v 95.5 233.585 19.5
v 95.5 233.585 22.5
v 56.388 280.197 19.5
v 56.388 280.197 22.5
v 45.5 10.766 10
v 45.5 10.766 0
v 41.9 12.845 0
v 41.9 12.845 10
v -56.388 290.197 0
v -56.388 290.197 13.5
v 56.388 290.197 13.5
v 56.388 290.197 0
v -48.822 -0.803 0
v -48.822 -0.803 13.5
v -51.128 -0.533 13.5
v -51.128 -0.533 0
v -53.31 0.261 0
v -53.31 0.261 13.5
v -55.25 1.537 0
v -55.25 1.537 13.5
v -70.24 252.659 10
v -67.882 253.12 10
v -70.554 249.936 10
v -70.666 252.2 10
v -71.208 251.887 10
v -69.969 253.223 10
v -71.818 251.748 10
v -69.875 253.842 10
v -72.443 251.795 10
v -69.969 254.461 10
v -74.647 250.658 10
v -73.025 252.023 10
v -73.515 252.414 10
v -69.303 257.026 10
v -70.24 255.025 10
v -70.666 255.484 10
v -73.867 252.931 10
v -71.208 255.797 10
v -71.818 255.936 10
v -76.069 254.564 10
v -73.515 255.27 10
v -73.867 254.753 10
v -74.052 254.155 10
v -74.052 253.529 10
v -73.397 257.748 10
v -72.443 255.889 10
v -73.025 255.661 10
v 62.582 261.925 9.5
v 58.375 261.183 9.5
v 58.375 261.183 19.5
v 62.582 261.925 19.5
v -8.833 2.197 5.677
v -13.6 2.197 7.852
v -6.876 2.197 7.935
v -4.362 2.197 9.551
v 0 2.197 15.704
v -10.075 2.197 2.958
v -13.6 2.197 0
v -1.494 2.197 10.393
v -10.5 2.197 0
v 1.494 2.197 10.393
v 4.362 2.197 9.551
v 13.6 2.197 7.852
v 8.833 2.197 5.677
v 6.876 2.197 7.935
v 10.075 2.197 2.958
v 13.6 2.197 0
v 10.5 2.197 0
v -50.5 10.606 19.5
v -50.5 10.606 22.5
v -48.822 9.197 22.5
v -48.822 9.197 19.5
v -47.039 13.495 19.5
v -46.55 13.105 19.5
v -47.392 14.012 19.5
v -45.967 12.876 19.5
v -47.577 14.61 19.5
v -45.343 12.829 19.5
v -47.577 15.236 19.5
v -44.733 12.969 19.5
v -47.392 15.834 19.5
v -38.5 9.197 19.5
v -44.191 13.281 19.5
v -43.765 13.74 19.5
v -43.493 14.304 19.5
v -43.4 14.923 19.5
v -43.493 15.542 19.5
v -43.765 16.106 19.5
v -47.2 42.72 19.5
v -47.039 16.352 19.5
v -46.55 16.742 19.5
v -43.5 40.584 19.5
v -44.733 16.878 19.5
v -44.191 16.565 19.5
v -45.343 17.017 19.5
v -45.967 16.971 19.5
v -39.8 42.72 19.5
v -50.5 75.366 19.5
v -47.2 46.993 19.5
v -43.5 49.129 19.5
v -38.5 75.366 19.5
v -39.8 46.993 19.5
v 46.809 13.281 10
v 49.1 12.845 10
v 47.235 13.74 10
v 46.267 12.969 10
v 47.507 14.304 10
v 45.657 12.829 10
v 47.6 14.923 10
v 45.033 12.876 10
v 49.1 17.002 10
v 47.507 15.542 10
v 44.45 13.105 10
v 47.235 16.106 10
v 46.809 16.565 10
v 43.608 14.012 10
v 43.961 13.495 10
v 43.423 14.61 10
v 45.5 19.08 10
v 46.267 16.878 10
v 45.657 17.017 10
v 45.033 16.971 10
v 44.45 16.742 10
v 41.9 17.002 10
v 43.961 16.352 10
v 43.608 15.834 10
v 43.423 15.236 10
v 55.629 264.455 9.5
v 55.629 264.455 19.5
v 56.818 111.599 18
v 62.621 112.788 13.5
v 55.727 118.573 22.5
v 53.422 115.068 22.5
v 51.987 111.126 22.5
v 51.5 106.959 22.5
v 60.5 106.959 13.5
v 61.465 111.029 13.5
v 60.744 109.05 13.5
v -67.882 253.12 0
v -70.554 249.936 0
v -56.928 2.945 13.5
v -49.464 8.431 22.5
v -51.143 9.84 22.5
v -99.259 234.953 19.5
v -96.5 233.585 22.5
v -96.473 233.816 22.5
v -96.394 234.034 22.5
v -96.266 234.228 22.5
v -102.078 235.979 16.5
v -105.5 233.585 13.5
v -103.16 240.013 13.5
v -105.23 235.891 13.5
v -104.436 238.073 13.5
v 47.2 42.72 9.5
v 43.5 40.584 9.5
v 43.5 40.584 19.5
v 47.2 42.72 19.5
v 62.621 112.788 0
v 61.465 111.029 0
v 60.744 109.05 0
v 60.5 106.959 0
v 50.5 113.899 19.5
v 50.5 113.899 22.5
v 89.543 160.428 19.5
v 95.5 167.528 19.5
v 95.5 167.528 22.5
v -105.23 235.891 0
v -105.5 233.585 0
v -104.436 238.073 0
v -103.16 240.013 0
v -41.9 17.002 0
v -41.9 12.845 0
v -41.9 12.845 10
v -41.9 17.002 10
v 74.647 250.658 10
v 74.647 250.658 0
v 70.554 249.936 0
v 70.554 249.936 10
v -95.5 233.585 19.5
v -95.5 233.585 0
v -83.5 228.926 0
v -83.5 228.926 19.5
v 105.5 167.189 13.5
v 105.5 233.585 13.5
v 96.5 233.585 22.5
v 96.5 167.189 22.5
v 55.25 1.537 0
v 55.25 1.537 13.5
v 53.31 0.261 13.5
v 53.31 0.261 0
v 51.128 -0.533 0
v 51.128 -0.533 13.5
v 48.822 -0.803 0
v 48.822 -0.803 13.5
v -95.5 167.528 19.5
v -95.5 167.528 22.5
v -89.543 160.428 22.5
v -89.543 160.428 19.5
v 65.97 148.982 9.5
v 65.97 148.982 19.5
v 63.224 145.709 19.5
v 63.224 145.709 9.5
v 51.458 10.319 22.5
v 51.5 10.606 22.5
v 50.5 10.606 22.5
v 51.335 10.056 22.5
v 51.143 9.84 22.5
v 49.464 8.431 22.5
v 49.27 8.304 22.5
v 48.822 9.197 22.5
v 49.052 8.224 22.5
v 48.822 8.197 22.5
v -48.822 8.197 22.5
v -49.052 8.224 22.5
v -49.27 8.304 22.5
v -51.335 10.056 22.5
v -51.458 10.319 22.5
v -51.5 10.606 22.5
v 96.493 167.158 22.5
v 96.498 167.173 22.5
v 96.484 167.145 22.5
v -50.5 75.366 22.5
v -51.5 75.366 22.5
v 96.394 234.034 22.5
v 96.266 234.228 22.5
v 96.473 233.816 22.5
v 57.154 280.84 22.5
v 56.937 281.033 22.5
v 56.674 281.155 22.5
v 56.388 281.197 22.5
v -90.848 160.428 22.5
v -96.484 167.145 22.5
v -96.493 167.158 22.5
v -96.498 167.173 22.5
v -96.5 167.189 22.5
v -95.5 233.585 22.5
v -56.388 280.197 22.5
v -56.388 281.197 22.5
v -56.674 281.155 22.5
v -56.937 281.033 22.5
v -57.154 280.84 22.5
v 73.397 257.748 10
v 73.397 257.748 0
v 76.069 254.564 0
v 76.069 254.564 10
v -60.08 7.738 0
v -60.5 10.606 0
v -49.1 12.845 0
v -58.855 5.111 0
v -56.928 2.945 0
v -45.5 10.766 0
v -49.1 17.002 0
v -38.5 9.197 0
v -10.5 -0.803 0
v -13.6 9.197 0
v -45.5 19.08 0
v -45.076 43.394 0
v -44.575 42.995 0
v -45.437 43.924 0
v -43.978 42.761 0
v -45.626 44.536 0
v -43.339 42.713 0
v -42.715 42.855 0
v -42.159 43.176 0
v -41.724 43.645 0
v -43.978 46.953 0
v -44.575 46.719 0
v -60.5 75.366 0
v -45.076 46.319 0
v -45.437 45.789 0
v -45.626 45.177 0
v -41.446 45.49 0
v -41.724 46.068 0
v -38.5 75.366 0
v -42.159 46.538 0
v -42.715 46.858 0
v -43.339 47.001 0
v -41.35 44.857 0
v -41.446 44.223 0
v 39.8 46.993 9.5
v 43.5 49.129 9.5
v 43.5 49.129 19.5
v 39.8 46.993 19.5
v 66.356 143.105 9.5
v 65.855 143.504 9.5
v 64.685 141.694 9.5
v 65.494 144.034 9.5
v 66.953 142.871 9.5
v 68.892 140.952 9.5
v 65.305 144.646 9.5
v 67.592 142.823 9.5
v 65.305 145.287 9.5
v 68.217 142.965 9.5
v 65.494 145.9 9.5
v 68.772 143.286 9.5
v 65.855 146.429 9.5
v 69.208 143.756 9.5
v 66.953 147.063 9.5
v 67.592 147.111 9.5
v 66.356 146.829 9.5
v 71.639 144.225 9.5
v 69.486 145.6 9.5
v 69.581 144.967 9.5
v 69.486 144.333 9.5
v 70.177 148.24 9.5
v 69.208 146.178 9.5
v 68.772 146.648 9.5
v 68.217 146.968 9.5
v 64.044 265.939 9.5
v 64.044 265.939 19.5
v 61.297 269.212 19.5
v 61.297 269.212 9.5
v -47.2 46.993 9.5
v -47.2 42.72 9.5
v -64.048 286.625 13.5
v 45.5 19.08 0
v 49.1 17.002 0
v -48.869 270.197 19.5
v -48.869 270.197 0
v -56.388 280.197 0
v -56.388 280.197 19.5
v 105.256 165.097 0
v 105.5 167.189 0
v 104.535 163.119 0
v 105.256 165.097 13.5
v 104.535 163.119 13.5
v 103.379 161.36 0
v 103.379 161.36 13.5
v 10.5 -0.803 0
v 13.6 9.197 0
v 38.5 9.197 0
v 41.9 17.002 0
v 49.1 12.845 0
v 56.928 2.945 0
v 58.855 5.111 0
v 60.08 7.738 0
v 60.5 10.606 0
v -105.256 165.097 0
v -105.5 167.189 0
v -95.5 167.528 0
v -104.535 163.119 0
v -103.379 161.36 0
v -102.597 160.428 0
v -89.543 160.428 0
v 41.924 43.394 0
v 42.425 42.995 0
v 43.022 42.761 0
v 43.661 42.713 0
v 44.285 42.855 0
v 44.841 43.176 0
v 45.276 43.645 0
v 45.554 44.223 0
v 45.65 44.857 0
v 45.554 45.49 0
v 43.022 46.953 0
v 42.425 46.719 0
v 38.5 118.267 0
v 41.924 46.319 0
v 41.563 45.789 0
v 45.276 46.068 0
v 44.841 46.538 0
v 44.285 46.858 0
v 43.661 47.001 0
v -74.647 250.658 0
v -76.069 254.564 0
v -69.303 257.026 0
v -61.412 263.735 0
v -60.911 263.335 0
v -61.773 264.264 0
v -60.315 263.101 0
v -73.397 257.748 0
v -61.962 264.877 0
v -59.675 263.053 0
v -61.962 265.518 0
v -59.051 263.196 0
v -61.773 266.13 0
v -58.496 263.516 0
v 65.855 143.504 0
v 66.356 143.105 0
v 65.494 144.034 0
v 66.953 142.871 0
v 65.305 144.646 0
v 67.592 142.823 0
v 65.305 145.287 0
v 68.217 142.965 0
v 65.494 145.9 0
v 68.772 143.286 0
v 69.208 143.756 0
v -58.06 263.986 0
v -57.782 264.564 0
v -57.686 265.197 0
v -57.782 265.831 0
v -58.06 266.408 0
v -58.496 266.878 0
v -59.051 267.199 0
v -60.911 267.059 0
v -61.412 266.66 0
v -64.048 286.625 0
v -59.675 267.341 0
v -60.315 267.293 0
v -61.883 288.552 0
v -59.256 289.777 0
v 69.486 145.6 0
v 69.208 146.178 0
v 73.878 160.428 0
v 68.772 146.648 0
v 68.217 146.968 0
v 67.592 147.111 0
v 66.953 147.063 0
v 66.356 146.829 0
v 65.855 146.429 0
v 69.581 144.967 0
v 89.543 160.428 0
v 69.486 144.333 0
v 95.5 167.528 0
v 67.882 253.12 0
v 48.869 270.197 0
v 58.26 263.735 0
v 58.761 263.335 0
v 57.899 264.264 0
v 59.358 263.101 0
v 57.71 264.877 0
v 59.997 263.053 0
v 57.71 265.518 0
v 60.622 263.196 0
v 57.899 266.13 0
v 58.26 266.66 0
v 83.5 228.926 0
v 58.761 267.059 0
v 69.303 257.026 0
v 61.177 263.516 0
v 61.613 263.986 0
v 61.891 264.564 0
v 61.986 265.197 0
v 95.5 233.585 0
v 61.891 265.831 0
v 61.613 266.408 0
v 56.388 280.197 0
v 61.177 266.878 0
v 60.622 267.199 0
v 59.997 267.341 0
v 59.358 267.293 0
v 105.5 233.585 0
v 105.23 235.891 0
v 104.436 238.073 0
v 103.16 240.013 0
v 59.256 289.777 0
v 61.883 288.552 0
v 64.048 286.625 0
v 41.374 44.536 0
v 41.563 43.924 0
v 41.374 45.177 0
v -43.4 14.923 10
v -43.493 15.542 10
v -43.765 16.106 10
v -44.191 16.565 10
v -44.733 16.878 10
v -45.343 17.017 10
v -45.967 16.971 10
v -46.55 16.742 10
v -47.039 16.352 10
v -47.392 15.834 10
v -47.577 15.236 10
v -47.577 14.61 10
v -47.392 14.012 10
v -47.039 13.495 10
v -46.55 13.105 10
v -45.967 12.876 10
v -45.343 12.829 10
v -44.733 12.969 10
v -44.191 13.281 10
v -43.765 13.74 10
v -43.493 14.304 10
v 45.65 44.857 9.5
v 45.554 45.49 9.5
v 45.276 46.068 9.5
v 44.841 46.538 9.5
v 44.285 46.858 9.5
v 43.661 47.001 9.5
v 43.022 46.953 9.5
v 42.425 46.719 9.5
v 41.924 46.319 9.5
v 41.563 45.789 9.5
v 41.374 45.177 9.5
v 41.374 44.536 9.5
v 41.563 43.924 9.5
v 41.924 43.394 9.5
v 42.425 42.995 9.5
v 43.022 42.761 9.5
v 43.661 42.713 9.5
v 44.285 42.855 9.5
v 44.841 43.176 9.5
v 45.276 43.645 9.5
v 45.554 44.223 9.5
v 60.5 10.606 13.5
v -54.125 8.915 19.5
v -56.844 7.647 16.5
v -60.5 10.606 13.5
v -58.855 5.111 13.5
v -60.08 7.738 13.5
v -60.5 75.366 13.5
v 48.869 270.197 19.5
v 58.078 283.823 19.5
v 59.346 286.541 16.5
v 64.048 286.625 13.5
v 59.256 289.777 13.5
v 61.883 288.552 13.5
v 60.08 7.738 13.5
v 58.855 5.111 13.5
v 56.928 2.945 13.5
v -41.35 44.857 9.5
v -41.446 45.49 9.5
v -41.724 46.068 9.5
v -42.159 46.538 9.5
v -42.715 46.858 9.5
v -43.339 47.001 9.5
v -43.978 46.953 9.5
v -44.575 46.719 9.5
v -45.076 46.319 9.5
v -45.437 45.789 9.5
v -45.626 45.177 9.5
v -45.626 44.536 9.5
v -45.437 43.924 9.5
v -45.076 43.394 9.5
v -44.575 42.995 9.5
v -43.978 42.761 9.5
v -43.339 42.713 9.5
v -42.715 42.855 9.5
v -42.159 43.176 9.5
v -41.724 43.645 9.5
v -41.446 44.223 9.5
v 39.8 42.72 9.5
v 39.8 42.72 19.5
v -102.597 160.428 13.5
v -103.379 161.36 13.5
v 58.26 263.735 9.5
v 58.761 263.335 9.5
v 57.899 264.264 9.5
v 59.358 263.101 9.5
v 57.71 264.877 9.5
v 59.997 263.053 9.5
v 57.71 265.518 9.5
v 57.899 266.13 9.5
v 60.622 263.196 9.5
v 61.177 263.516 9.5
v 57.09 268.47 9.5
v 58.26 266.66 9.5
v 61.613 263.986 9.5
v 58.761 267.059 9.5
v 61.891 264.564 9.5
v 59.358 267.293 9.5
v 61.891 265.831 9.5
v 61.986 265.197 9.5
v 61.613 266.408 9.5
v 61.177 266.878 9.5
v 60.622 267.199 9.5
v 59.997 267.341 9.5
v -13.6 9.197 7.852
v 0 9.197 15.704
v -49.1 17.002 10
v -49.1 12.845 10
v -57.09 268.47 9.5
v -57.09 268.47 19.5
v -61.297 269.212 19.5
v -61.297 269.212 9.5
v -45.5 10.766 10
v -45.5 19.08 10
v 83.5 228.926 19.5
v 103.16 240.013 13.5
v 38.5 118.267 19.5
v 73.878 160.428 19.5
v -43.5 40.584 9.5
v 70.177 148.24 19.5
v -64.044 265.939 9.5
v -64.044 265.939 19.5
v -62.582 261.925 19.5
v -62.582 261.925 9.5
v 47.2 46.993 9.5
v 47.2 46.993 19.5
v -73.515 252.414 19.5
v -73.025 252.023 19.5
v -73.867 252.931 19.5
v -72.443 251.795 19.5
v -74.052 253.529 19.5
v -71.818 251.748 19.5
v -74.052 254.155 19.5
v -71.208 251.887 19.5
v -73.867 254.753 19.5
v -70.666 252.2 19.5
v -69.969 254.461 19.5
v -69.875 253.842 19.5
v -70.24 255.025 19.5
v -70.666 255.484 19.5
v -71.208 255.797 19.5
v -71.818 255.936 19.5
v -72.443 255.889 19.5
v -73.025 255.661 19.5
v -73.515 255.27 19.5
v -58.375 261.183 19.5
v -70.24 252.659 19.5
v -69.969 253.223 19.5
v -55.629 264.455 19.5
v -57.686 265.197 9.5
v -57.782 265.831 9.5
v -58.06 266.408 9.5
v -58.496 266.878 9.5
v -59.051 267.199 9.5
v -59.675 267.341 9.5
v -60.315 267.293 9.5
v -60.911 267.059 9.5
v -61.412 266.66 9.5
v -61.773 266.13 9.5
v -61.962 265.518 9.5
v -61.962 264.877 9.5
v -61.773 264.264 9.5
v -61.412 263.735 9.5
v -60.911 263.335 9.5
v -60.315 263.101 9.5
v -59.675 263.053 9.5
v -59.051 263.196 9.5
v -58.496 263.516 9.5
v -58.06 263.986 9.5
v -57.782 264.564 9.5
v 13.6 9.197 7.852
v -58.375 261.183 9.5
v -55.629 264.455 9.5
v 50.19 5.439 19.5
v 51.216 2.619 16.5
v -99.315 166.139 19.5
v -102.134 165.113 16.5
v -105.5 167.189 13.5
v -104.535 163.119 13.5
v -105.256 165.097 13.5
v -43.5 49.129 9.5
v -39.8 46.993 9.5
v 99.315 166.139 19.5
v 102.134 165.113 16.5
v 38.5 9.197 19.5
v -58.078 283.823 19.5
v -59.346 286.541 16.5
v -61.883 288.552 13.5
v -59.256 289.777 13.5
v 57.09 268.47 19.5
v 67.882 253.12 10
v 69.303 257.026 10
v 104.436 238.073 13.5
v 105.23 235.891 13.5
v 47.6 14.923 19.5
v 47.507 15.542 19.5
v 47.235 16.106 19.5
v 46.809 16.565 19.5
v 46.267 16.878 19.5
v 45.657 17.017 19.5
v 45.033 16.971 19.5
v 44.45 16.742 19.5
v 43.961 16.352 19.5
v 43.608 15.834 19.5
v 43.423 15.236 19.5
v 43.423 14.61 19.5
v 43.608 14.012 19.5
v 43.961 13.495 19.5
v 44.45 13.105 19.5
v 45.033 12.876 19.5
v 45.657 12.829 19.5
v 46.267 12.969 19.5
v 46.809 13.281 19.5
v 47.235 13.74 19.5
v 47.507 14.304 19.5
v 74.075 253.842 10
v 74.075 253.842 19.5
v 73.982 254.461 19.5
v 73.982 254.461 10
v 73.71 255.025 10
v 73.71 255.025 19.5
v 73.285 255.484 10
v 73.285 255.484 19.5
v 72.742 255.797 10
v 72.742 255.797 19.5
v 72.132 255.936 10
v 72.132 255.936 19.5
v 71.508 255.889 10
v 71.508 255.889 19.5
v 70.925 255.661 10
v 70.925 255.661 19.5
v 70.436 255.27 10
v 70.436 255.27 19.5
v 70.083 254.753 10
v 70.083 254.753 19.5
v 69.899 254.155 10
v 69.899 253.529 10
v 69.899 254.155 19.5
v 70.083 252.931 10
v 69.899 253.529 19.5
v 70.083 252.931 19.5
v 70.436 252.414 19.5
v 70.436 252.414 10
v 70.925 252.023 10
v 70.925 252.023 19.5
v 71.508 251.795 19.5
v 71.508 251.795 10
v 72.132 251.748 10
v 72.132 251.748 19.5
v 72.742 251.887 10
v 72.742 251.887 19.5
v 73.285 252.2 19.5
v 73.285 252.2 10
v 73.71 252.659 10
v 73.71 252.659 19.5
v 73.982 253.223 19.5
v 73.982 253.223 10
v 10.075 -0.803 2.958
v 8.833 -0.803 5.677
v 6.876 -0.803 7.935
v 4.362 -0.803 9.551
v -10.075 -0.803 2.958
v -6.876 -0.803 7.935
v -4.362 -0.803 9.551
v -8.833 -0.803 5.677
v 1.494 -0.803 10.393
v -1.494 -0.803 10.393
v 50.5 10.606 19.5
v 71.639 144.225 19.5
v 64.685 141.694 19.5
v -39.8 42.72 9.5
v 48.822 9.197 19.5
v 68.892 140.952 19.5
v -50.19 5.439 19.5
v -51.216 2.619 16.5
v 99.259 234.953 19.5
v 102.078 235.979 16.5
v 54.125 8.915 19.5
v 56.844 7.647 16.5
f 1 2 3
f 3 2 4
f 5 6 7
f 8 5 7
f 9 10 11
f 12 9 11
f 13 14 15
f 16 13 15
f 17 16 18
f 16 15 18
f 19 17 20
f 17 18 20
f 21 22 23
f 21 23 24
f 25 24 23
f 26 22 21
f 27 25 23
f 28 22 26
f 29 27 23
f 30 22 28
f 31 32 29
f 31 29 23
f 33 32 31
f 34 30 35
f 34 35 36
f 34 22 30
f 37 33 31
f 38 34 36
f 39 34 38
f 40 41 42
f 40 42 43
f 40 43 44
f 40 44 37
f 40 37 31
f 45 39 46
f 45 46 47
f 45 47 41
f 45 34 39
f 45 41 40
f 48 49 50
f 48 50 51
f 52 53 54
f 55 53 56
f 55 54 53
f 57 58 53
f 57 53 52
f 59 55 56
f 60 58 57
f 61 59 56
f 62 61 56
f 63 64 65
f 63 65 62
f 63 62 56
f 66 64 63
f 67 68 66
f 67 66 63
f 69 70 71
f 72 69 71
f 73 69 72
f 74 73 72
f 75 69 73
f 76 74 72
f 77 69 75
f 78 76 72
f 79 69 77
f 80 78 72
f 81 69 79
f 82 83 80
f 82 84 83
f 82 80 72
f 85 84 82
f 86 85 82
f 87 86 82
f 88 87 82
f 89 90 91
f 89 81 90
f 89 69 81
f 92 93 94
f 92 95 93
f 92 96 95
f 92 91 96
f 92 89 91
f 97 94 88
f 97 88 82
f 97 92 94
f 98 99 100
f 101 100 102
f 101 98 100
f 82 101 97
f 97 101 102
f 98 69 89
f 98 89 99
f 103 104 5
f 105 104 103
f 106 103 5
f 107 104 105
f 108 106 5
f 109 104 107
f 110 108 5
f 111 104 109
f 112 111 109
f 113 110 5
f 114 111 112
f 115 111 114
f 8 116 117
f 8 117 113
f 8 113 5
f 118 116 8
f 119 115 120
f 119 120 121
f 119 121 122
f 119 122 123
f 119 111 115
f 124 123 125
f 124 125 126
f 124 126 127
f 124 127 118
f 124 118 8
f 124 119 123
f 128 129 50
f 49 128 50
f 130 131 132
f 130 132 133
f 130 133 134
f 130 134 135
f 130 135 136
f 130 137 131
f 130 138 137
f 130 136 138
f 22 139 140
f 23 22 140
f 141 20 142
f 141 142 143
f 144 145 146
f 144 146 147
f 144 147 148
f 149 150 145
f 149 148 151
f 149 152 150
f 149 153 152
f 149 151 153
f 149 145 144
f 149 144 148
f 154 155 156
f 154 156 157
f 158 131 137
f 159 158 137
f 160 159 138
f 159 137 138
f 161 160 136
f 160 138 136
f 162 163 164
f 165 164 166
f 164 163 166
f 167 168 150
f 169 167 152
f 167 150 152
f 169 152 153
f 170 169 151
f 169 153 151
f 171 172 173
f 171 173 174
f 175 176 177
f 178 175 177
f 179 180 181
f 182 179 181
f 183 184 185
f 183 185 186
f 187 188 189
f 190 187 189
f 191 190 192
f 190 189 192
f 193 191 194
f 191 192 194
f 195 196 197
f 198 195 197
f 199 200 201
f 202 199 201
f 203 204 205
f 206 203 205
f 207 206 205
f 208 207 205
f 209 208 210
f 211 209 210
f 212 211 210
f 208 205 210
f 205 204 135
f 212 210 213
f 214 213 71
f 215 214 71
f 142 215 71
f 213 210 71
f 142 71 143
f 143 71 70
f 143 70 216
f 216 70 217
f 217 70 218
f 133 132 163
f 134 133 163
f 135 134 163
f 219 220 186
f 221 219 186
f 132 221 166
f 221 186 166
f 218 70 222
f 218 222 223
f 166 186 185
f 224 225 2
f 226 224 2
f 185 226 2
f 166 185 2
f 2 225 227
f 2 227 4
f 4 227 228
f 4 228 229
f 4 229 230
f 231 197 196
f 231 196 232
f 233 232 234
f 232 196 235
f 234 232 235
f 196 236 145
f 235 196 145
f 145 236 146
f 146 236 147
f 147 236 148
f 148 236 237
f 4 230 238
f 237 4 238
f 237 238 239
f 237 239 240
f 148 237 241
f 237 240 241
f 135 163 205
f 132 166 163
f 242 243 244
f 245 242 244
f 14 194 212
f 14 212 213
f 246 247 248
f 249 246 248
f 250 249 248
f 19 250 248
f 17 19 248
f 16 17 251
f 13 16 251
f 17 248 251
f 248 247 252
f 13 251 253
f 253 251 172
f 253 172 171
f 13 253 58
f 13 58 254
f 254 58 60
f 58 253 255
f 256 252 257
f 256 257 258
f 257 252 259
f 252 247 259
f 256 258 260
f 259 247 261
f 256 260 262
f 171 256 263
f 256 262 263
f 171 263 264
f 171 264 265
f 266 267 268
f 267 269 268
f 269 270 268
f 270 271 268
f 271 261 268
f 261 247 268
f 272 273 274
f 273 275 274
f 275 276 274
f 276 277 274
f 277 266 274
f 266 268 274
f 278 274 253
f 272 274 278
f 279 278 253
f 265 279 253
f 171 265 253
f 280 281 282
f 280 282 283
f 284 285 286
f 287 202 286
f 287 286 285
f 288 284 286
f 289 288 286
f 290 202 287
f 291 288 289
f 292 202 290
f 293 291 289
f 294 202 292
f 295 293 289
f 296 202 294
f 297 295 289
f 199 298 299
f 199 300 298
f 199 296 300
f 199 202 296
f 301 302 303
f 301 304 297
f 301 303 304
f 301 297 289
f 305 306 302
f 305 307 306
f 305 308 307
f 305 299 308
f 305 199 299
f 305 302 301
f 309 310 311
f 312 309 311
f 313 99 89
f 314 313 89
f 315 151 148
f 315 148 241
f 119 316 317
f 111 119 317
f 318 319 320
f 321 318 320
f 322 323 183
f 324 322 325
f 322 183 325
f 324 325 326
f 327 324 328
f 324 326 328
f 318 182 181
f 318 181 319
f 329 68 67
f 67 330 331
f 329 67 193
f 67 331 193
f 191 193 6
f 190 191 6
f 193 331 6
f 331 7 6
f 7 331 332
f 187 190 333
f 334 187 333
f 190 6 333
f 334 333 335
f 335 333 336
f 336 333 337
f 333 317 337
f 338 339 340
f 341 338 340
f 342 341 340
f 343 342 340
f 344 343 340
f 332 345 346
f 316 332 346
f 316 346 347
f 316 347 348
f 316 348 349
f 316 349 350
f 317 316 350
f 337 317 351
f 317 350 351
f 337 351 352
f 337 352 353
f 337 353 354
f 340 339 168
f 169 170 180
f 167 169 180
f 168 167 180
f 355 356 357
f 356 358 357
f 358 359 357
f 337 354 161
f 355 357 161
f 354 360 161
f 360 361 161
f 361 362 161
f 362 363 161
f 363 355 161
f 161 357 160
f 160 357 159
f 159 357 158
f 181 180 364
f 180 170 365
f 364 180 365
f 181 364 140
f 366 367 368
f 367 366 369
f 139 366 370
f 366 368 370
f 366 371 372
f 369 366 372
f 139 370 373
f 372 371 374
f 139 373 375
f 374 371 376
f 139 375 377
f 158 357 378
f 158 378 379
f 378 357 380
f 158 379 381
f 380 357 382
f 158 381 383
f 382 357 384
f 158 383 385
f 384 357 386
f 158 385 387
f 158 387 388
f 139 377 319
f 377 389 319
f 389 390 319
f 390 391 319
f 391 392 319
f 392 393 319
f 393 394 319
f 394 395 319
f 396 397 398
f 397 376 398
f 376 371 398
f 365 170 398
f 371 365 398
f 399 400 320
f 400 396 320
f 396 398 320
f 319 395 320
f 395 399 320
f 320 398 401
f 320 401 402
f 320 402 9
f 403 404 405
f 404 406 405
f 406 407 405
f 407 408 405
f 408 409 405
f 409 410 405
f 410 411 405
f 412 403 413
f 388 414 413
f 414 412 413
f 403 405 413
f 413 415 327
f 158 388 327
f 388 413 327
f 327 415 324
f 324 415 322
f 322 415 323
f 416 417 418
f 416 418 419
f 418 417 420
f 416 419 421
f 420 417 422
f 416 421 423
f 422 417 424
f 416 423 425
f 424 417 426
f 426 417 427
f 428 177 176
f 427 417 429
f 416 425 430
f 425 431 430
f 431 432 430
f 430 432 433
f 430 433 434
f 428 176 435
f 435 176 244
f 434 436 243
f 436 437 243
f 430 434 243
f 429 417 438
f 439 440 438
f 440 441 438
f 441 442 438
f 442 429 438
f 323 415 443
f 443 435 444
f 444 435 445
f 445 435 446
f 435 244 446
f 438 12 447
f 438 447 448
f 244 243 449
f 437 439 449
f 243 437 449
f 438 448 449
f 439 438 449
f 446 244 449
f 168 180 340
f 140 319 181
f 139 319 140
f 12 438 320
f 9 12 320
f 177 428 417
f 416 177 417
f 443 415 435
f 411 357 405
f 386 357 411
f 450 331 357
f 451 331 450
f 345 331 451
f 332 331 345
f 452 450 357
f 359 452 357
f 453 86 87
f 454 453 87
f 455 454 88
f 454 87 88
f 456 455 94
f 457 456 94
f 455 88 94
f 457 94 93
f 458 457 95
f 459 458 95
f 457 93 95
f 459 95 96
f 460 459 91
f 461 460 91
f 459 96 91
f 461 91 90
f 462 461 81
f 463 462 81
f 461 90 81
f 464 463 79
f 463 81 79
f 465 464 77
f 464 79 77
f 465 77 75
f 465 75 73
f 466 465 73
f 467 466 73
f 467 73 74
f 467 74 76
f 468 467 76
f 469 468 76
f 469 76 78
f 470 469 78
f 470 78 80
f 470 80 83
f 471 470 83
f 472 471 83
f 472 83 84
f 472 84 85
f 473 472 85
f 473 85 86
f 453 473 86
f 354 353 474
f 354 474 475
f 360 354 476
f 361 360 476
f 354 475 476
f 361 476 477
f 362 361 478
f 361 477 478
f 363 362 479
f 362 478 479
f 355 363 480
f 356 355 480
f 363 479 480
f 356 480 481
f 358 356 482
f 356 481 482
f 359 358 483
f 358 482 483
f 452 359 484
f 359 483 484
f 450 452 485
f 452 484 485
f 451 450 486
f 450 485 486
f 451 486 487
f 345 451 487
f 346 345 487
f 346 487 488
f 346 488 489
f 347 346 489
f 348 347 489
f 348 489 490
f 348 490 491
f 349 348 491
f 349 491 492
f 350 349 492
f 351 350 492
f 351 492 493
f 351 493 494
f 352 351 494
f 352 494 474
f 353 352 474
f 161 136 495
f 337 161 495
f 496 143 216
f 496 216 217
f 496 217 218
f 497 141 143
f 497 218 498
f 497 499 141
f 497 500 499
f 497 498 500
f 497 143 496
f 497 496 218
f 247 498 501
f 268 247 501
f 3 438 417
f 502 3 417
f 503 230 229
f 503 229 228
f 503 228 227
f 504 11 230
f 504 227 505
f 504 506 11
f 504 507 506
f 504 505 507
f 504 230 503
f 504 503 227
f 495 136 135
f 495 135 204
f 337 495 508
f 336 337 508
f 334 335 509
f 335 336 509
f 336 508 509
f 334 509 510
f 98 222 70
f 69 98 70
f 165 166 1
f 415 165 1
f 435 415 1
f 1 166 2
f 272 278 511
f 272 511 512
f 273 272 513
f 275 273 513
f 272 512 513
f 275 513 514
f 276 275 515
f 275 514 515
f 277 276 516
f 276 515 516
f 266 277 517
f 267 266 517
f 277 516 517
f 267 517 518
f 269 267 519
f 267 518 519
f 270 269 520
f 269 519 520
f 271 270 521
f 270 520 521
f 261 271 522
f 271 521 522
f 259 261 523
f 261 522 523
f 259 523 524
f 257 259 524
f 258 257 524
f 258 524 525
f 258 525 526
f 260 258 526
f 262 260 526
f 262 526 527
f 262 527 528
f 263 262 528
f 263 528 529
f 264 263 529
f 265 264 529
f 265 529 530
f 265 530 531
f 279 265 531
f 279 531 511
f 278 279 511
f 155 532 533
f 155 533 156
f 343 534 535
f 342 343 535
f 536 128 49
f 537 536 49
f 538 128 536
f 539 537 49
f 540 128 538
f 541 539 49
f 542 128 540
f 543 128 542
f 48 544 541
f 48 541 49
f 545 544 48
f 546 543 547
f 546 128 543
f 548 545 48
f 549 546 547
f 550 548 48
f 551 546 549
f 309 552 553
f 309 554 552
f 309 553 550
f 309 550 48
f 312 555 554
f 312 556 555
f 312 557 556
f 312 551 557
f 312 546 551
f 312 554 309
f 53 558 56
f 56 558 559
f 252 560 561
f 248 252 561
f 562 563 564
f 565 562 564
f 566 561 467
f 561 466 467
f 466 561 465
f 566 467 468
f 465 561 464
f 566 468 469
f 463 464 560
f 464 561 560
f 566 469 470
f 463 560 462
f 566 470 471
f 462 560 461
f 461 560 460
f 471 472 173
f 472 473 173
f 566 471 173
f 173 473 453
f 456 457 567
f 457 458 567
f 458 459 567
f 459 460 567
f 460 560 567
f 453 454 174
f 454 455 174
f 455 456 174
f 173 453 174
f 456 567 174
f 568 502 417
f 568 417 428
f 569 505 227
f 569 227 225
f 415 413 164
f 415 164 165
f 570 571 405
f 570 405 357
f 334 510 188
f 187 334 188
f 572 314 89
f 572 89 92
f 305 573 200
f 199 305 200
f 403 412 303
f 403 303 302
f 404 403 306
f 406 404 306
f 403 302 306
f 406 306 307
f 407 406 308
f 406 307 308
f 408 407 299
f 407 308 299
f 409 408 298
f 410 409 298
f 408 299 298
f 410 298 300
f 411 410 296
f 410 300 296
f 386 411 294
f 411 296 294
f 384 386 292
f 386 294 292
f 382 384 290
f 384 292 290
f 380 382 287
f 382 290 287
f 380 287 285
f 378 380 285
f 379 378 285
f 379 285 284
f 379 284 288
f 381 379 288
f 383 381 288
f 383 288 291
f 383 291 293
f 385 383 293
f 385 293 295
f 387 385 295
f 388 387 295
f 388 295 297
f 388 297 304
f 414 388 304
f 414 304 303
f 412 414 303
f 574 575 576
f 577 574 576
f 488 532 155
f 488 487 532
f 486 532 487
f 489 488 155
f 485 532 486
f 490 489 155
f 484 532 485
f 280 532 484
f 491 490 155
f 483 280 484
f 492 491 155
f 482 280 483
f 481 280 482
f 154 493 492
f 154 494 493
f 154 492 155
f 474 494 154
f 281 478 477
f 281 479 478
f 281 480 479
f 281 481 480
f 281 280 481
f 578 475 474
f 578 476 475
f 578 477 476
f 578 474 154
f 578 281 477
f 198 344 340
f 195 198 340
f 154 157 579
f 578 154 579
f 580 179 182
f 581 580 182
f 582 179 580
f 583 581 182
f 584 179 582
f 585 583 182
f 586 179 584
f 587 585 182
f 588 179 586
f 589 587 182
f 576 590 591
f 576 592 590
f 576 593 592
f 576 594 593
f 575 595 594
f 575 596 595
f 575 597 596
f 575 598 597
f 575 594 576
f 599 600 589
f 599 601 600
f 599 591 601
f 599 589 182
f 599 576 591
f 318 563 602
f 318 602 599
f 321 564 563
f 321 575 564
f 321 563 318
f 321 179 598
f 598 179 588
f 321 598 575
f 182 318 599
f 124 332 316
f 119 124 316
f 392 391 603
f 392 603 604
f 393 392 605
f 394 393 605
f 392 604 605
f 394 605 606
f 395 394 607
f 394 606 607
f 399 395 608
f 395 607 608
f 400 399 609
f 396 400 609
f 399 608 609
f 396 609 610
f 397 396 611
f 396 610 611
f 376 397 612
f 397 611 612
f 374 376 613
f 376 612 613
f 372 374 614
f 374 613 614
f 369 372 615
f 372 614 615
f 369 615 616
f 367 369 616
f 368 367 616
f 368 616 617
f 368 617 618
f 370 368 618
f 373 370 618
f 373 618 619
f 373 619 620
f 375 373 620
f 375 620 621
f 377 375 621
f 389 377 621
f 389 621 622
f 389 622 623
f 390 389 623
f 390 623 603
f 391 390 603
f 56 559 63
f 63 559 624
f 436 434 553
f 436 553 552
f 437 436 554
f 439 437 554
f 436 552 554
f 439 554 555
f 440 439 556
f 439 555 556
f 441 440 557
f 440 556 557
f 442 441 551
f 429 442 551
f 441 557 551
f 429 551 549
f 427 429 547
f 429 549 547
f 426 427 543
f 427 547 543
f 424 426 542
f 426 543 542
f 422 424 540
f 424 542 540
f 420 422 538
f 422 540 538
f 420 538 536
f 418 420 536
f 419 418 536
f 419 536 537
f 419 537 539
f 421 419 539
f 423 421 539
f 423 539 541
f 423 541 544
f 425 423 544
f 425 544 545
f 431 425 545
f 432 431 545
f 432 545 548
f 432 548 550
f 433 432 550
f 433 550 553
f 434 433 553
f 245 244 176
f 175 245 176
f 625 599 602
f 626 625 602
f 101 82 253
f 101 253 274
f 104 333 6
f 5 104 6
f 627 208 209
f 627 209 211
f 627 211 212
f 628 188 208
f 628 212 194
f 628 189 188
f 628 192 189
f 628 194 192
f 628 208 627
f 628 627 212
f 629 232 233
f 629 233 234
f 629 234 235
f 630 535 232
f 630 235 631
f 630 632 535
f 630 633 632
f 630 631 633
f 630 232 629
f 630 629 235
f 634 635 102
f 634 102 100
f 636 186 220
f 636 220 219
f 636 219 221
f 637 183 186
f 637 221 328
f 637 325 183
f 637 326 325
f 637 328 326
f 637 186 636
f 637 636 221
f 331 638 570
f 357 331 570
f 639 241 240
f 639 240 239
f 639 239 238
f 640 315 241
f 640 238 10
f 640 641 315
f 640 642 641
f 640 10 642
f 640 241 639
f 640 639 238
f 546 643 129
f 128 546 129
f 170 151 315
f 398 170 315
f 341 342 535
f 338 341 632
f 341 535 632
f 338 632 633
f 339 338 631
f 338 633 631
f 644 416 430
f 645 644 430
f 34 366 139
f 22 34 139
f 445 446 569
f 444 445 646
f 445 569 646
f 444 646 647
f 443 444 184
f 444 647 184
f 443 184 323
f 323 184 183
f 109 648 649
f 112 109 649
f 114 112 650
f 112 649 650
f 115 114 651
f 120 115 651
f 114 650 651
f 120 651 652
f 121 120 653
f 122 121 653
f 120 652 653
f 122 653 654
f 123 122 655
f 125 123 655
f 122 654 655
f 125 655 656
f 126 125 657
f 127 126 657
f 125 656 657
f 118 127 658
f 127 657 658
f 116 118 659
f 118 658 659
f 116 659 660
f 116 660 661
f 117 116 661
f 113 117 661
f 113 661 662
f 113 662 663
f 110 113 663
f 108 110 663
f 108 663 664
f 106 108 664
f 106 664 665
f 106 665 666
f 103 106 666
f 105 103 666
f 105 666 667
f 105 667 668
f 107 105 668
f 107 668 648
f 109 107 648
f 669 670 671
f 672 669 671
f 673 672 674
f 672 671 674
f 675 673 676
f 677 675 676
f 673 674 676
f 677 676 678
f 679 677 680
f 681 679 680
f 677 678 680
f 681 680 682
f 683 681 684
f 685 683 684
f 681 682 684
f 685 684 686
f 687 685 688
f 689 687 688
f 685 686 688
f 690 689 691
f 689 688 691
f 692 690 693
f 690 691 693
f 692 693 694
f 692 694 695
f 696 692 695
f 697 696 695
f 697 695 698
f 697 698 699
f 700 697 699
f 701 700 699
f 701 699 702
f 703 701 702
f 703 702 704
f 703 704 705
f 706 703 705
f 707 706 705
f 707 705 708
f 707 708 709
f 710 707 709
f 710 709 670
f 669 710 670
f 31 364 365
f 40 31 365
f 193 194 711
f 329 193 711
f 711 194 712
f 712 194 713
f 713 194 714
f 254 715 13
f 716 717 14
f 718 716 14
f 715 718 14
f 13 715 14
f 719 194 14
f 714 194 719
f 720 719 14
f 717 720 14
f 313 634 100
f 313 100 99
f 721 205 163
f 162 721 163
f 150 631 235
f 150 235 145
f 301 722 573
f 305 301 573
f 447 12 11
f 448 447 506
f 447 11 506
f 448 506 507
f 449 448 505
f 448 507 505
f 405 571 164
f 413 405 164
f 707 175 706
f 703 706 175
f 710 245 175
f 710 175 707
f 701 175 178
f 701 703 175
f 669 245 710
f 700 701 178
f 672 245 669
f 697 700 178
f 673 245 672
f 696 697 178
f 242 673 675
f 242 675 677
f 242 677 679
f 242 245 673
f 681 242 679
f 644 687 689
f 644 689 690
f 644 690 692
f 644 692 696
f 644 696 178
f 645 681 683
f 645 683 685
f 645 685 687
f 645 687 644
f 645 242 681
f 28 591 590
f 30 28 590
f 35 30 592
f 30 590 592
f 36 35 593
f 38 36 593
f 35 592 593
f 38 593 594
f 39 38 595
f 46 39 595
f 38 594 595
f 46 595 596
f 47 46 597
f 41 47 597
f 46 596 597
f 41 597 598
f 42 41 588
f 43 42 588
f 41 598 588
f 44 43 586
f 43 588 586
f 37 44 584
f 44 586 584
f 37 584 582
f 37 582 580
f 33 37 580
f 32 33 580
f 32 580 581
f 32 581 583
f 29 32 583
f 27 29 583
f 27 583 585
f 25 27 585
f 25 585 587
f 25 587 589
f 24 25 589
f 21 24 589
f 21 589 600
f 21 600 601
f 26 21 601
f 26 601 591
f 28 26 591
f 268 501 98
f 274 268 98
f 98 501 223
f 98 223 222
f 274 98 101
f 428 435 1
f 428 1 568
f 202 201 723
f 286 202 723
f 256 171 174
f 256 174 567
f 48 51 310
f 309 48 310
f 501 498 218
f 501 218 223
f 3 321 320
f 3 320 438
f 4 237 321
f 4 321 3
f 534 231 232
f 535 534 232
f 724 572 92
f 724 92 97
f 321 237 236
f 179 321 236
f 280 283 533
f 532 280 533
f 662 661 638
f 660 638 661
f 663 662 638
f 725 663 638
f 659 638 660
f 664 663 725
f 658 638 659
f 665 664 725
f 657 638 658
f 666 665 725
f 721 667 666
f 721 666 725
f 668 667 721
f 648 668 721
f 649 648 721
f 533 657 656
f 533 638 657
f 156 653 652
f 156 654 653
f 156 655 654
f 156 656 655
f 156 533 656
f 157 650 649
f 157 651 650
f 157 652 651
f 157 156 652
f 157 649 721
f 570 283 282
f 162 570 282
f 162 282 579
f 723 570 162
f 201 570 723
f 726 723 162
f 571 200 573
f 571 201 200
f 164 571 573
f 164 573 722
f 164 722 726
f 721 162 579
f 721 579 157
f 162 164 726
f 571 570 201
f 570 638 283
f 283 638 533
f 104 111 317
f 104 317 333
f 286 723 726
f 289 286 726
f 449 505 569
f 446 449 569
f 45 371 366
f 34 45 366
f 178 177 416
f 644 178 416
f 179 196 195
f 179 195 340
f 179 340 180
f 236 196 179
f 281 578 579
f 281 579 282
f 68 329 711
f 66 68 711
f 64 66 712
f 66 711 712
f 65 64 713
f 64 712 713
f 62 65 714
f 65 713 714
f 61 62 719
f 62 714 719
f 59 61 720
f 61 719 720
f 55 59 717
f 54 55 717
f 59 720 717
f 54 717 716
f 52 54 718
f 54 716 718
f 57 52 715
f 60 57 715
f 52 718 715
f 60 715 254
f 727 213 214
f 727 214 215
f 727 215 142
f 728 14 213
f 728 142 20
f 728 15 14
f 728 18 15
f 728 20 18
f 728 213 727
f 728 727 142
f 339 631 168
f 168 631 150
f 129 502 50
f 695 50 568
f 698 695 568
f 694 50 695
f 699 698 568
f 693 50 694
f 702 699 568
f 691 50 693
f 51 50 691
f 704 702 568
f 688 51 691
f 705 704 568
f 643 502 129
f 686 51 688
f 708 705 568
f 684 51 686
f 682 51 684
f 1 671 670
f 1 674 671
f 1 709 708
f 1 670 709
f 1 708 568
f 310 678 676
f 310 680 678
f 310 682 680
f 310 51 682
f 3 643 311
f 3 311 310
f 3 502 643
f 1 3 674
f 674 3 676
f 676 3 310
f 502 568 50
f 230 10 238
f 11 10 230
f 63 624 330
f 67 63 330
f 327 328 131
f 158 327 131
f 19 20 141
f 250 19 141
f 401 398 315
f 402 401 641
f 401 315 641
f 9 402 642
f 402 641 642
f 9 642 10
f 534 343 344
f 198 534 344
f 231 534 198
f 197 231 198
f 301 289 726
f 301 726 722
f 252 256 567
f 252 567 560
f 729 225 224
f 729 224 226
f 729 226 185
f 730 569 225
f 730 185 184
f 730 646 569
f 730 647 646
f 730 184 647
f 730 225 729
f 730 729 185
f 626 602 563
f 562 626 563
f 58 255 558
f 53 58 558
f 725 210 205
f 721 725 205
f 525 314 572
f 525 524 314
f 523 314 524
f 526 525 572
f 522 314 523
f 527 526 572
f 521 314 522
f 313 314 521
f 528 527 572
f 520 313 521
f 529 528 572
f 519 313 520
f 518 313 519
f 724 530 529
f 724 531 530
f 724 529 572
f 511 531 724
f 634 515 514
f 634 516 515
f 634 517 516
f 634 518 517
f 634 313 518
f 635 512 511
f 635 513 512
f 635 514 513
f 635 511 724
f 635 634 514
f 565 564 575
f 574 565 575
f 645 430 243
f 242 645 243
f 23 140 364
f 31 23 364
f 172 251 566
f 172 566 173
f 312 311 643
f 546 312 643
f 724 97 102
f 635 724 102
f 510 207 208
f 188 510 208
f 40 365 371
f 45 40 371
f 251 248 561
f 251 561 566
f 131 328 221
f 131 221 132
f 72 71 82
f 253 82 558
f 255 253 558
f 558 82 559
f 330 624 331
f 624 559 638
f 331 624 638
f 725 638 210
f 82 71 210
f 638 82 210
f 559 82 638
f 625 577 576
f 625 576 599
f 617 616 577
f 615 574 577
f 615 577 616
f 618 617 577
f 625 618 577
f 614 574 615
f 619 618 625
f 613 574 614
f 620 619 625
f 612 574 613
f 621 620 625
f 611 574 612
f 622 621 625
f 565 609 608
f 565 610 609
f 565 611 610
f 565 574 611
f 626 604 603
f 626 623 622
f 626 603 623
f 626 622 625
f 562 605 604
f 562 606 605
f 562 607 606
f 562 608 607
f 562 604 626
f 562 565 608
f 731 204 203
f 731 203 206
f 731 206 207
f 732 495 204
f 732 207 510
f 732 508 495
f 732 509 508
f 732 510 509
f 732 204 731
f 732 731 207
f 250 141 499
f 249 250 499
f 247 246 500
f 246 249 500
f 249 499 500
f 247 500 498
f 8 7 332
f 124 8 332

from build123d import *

# Parameters (mm, degrees)
RESSALTO_EXTRUS_O1_DEPTH = 22.5
CHANFRO1_SIZE            = 9
CORTE_EXTRUS_O1_REACH    = 24.5
ESBO_O3_W                = 1139.230904301
ESBO_O3_H                = 709.798033895
CORTE_EXTRUS_O5_DEPTH    = 3
CORTE_EXTRUS_O6_REACH    = 21.5
ESBO_O5_W                = 77
ESBO_O5_H                = 10
ESBO_O7_R                = 2.1
ESBO_O7_R_2              = 2.15
CORTE_EXTRUS_O7_DEPTH    = 23.5
CORTE_EXTRUS_O8_DEPTH    = 10
ESBO_O9_W                = 92.788829696
ESBO_O9_H                = 85.062360753
CORTE_EXTRUS_O9_DEPTH    = 23.5
CORTE_EXTRUS_O10_REACH   = 21.5
CORTE_EXTRUS_O11_DEPTH   = 7
ESBO_O12_R               = 10.5
CORTE_EXTRUS_O12_DEPTH   = 7
CORTE_EXTRUS_O13_DEPTH   = 10


with BuildPart() as part:
    # Esboço1 → Ressalto-extrusão1 (new body, symmetric)
    with BuildSketch(Plane.XY):
        with BuildLine():
            Line((-56.387503511, 290.197344596), (56.387503511, 290.197344596))
            ThreePointArc((56.387503511, 290.197344596), (60.613686129, 289.260422466), (64.047947942, 286.625220692))
            Line((64.047947942, 286.625220692), (103.160444431, 240.012762487))
            ThreePointArc((103.160444431, 240.012762487), (104.896926208, 237.005087823), (105.5, 233.58488639))
            Line((105.5, 233.58488639), (105.5, 167.188670131))
            ThreePointArc((105.5, 167.188670131), (104.953136861, 164.08725515), (103.378507208, 161.359916588))
            Line((103.378507208, 161.359916588), (62.621492792, 112.787598236))
            ThreePointArc((62.621492792, 112.787598236), (61.046863139, 110.060259674), (60.5, 106.958844693))
            Line((60.5, 106.958844693), (60.5, 10.605625498))
            ThreePointArc((60.5, 10.605625498), (59.56307787, 6.379442881), (56.927876097, 2.945181067))
            Line((56.927876097, 2.945181067), (55.249552272, 1.536900164))
            ThreePointArc((55.249552272, 1.536900164), (52.241877608, -0.199581612), (48.821676175, -0.802655404))
            Line((48.821676175, -0.802655404), (-48.821676175, -0.802655404))
            ThreePointArc((-48.821676175, -0.802655404), (-52.241877608, -0.199581612), (-55.249552272, 1.536900164))
            Line((-55.249552272, 1.536900164), (-56.927876097, 2.945181067))
            ThreePointArc((-56.927876097, 2.945181067), (-59.56307787, 6.379442881), (-60.5, 10.605625498))
            Line((-60.5, 10.605625498), (-60.5, 106.958844693))
            ThreePointArc((-60.5, 106.958844693), (-61.046863139, 110.060259674), (-62.621492792, 112.787598236))
            Line((-62.621492792, 112.787598236), (-103.378507208, 161.359916588))
            ThreePointArc((-103.378507208, 161.359916588), (-104.953136861, 164.08725515), (-105.5, 167.188670131))
            Line((-105.5, 167.188670131), (-105.5, 233.58488639))
            ThreePointArc((-105.5, 233.58488639), (-104.896926208, 237.005087823), (-103.160444431, 240.012762487))
            Line((-103.160444431, 240.012762487), (-64.047947942, 286.625220692))
            ThreePointArc((-64.047947942, 286.625220692), (-60.613686129, 289.260422466), (-56.387503511, 290.197344596))
        make_face()
        Polygon((-48.869071975, 270.197344596), (48.869071975, 270.197344596), (83.5, 228.925811707), (83.5, 171.895558399), (38.5, 118.266646732), (38.5, 19.197344596), (-38.5, 19.197344596), (-38.5, 118.266646732), (-83.5, 171.895558399), (-83.5, 228.925811707), align=None, mode=Mode.SUBTRACT)
    extrude(amount=RESSALTO_EXTRUS_O1_DEPTH, both=True)

    # Chanfro1
    chanfro1_edges = [part.edges().sort_by_distance(p)[0] for p in [
        (83.604196187, 263.318991589, 22.5),
        (60.613686129, 289.260422466, 22.5),
        (0, 290.197344596, 22.5),
        (-60.613686129, 289.260422466, 22.5),
        (-83.604196187, 263.318991589, 22.5),
        (-104.896926208, 237.005087823, 22.5),
        (-105.5, 200.38677826, 22.5),
        (-104.953136861, 164.08725515, 22.5),
        (-83, 137.073757412, 22.5),
        (-61.046863139, 110.060259674, 22.5),
        (-60.5, 58.782235095, 22.5),
        (-59.56307787, 6.379442881, 22.5),
        (-56.088714184, 2.241040616, 22.5),
        (-52.241877608, -0.199581612, 22.5),
        (0, -0.802655404, 22.5),
        (52.241877608, -0.199581612, 22.5),
        (56.088714184, 2.241040616, 22.5),
        (59.56307787, 6.379442881, 22.5),
        (60.5, 58.782235095, 22.5),
        (61.046863139, 110.060259674, 22.5),
        (83, 137.073757412, 22.5),
        (104.953136861, 164.08725515, 22.5),
        (105.5, 200.38677826, 22.5),
        (104.896926208, 237.005087823, 22.5),
    ]]
    chamfer(chanfro1_edges, length=CHANFRO1_SIZE)

    # Esboço3 → Corte-extrusão1 (cut, up to next)
    with BuildSketch(Plane.XY, mode=Mode.PRIVATE) as corte_extrus_o1_sk1:
        with Locations((-153.157436203, 152.53565808)):
            Rectangle(ESBO_O3_W, ESBO_O3_H)
    corte_extrus_o1_tool1 = extrude(corte_extrus_o1_sk1.sketch, amount=-CORTE_EXTRUS_O1_REACH, mode=Mode.PRIVATE) & part.part
    add(corte_extrus_o1_tool1.solids().sort_by_distance((-153.157436, 152.535658, 0))[0], mode=Mode.SUBTRACT)

    # Esboço4 → Corte-extrusão5 (cut)
    with BuildSketch(Plane.XY.offset(22.5)):
        Polygon((56.387503511, 280.197344596), (-56.387503511, 280.197344596), (-95.5, 233.58488639), (-95.5, 167.527915588), (-50.5, 113.899003921), (-50.5, 10.605625498), (-48.821676175, 9.197344596), (48.821676175, 9.197344596), (50.5, 10.605625498), (50.5, 113.899003921), (95.5, 167.527915588), (95.5, 233.58488639), align=None)
        Polygon((38.5, 19.197344596), (-38.5, 19.197344596), (-38.5, 121.489121124), (-83.5, 175.11803279), (-83.5, 228.925811707), (-48.869071975, 270.197344596), (48.869071975, 270.197344596), (83.5, 228.925811707), (83.5, 175.11803279), (38.5, 121.489121124), align=None, mode=Mode.SUBTRACT)
    extrude(amount=-CORTE_EXTRUS_O5_DEPTH, mode=Mode.SUBTRACT)

    # Esboço5 → Corte-extrusão6 (cut, up to next)
    with BuildSketch(Plane.XY.offset(19.5), mode=Mode.PRIVATE) as corte_extrus_o6_sk1:
        Polygon((-95.5, 233.58488639), (-83.5, 228.925811707), (-83.5, 171.895558399), (-95.5, 167.527915588), align=None)
    corte_extrus_o6_tool1 = extrude(corte_extrus_o6_sk1.sketch, amount=-CORTE_EXTRUS_O6_REACH, mode=Mode.PRIVATE) & part.part
    add(corte_extrus_o6_tool1.solids().sort_by_distance((-89.646672, 200.485324, 19.5))[0], mode=Mode.SUBTRACT)
    # Esboço5 → Corte-extrusão6 (cut, up to next)
    with BuildSketch(Plane.XY.offset(19.5), mode=Mode.PRIVATE) as corte_extrus_o6_sk2:
        Polygon((-48.869071975, 270.197344596), (-56.387503511, 280.197344596), (56.387503511, 280.197344596), (48.869071975, 270.197344596), align=None)
    corte_extrus_o6_tool2 = extrude(corte_extrus_o6_sk2.sketch, amount=-CORTE_EXTRUS_O6_REACH, mode=Mode.PRIVATE) & part.part
    add(corte_extrus_o6_tool2.solids().sort_by_distance((0, 275.316394, 19.5))[0], mode=Mode.SUBTRACT)
    # Esboço5 → Corte-extrusão6 (cut, up to next)
    with BuildSketch(Plane.XY.offset(19.5), mode=Mode.PRIVATE) as corte_extrus_o6_sk3:
        with Locations((0, 14.197344596)):
            Rectangle(ESBO_O5_W, ESBO_O5_H)
    corte_extrus_o6_tool3 = extrude(corte_extrus_o6_sk3.sketch, amount=-CORTE_EXTRUS_O6_REACH, mode=Mode.PRIVATE) & part.part
    add(corte_extrus_o6_tool3.solids().sort_by_distance((0, 14.197345, 19.5))[0], mode=Mode.SUBTRACT)
    # Esboço5 → Corte-extrusão6 (cut, up to next)
    with BuildSketch(Plane.XY.offset(19.5), mode=Mode.PRIVATE) as corte_extrus_o6_sk4:
        Polygon((83.5, 171.895558399), (95.5, 167.527915588), (95.5, 233.58488639), (83.5, 228.925811707), align=None)
    corte_extrus_o6_tool4 = extrude(corte_extrus_o6_sk4.sketch, amount=-CORTE_EXTRUS_O6_REACH, mode=Mode.PRIVATE) & part.part
    add(corte_extrus_o6_tool4.solids().sort_by_distance((89.646672, 200.485324, 19.5))[0], mode=Mode.SUBTRACT)

    # Esboço7 → Corte-extrusão7 (cut, through all)
    with BuildSketch(Plane.XY.offset(22.5)):
        with Locations((-45.5, 14.923339275)):
            Circle(ESBO_O7_R)
        with Locations((-43.5, 44.856598369)):
            Circle(ESBO_O7_R_2)
        with Locations((-71.975269931, 253.84194883)):
            Circle(ESBO_O7_R)
        with Locations((-59.836146954, 265.197344596)):
            Circle(ESBO_O7_R_2)
        with Locations((59.836146954, 265.197344596)):
            Circle(ESBO_O7_R_2)
        with Locations((71.975269931, 253.84194883)):
            Circle(ESBO_O7_R)
        with Locations((43.5, 44.856598369)):
            Circle(ESBO_O7_R_2)
        with Locations((45.5, 14.923339275)):
            Circle(ESBO_O7_R)
        with Locations((-67.431100943, 144.966771084)):
            Circle(ESBO_O7_R_2)
        with Locations((67.431100943, 144.966771084)):
            Circle(ESBO_O7_R_2)
    extrude(amount=-CORTE_EXTRUS_O7_DEPTH, mode=Mode.SUBTRACT)

    # Esboço8 → Corte-extrusão8 (cut)
    with BuildSketch(Plane(origin=(0, 0, 0), x_dir=(-1, 0, 0), z_dir=(0, 0, -1))):
        Polygon((-73.397020968, 257.748177701), (-76.069038884, 254.56379075), (-74.647287847, 250.657561879), (-70.553518893, 249.93571996), (-67.881500977, 253.120106911), (-69.303252014, 257.026335782), align=None)
        Polygon((-45.5, 19.080261213), (-49.1, 17.001800244), (-49.1, 12.844878306), (-45.5, 10.766417337), (-41.9, 12.844878306), (-41.9, 17.001800244), align=None)
        Polygon((41.9, 17.001800244), (45.5, 19.080261213), (49.1, 17.001800244), (49.1, 12.844878306), (45.5, 10.766417337), (41.9, 12.844878306), align=None)
        Polygon((76.069038884, 254.56379075), (73.397020968, 257.748177701), (69.303252014, 257.026335782), (67.881500977, 253.120106911), (70.553518893, 249.93571996), (74.647287847, 250.657561879), align=None)
        Polygon((67.580931876, 147.478918378), (71.560985025, 146.777127623), (72.943242978, 142.97940511), (70.345447782, 139.883473352), (66.365394632, 140.585264107), (64.98313668, 144.38298662), align=None)
    extrude(amount=-CORTE_EXTRUS_O8_DEPTH, mode=Mode.SUBTRACT)

    # Esboço9 → Corte-extrusão9 (cut, through all)
    with BuildSketch(Plane.XY.offset(22.5)):
        with Locations((-70.062226852, 117.896927121)):
            Rectangle(ESBO_O9_W, ESBO_O9_H)
    extrude(amount=-CORTE_EXTRUS_O9_DEPTH, mode=Mode.SUBTRACT)

    # Esboço10 → Corte-extrusão10 (cut, up to next)
    with BuildSketch(Plane.XY.offset(19.5), mode=Mode.PRIVATE) as corte_extrus_o10_sk1:
        Polygon((-95.5, 167.527915588), (-83.5, 171.895558399), (-73.877666178, 160.428107498), (-89.54255365, 160.428107498), align=None)
    corte_extrus_o10_tool1 = extrude(corte_extrus_o10_sk1.sketch, amount=-CORTE_EXTRUS_O10_REACH, mode=Mode.PRIVATE) & part.part
    add(corte_extrus_o10_tool1.solids().sort_by_distance((-85.062746, 165.15554, 19.5))[0], mode=Mode.SUBTRACT)
    # Esboço10 → Corte-extrusão10 (cut, up to next)
    with BuildSketch(Plane.XY.offset(19.5), mode=Mode.PRIVATE) as corte_extrus_o10_sk2:
        Polygon((89.54255365, 160.428107498), (95.5, 167.527915588), (83.5, 171.895558399), (73.877666178, 160.428107498), align=None)
    corte_extrus_o10_tool2 = extrude(corte_extrus_o10_sk2.sketch, amount=-CORTE_EXTRUS_O10_REACH, mode=Mode.PRIVATE) & part.part
    add(corte_extrus_o10_tool2.solids().sort_by_distance((85.062746, 165.15554, 19.5))[0], mode=Mode.SUBTRACT)

    # Esboço11 → Corte-extrusão11 (cut)
    with BuildSketch(Plane(origin=(0, 9.197344596, 0), x_dir=(1, 0, 0), z_dir=(0, 1, 0))):
        Polygon((0, -15.703927322), (13.6, -7.851963661), (13.6, 7.851963661), (0, 15.703927322), (-13.6, 7.851963661), (-13.6, -7.851963661), align=None)
    extrude(amount=-CORTE_EXTRUS_O11_DEPTH, mode=Mode.SUBTRACT)

    # Esboço12 → Corte-extrusão12 (cut)
    with BuildSketch(Plane.XZ.offset(0.802655404)):
        Circle(ESBO_O12_R)
    extrude(amount=-CORTE_EXTRUS_O12_DEPTH, mode=Mode.SUBTRACT)

    # Esboço13 → Corte-extrusão13 (cut)
    with BuildSketch(Plane.XY.offset(19.5)):
        Polygon((-57.089906317, 268.47018674), (-61.297391075, 269.212079824), (-64.043631711, 265.939237679), (-62.58238759, 261.924502451), (-58.374902832, 261.182609368), (-55.628662196, 264.455451512), align=None)
        Polygon((61.297391075, 269.212079824), (57.089906317, 268.47018674), (55.628662196, 264.455451512), (58.374902832, 261.182609368), (62.58238759, 261.924502451), (64.043631711, 265.939237679), align=None)
        Polygon((-47.2, 46.992794365), (-47.2, 42.720402373), (-43.5, 40.584206377), (-39.8, 42.720402373), (-39.8, 46.992794365), (-43.5, 49.128990361), align=None)
        Polygon((47.2, 46.992794365), (43.5, 49.128990361), (39.8, 46.992794365), (39.8, 42.720402373), (43.5, 40.584206377), (47.2, 42.720402373), align=None)
        Polygon((70.177341579, 148.239613229), (65.969856821, 148.981506312), (63.223616185, 145.708664168), (64.684860306, 141.69392894), (68.892345064, 140.952035856), (71.6385857, 144.224878001), align=None)
    extrude(amount=-CORTE_EXTRUS_O13_DEPTH, mode=Mode.SUBTRACT)


solid = part.part
